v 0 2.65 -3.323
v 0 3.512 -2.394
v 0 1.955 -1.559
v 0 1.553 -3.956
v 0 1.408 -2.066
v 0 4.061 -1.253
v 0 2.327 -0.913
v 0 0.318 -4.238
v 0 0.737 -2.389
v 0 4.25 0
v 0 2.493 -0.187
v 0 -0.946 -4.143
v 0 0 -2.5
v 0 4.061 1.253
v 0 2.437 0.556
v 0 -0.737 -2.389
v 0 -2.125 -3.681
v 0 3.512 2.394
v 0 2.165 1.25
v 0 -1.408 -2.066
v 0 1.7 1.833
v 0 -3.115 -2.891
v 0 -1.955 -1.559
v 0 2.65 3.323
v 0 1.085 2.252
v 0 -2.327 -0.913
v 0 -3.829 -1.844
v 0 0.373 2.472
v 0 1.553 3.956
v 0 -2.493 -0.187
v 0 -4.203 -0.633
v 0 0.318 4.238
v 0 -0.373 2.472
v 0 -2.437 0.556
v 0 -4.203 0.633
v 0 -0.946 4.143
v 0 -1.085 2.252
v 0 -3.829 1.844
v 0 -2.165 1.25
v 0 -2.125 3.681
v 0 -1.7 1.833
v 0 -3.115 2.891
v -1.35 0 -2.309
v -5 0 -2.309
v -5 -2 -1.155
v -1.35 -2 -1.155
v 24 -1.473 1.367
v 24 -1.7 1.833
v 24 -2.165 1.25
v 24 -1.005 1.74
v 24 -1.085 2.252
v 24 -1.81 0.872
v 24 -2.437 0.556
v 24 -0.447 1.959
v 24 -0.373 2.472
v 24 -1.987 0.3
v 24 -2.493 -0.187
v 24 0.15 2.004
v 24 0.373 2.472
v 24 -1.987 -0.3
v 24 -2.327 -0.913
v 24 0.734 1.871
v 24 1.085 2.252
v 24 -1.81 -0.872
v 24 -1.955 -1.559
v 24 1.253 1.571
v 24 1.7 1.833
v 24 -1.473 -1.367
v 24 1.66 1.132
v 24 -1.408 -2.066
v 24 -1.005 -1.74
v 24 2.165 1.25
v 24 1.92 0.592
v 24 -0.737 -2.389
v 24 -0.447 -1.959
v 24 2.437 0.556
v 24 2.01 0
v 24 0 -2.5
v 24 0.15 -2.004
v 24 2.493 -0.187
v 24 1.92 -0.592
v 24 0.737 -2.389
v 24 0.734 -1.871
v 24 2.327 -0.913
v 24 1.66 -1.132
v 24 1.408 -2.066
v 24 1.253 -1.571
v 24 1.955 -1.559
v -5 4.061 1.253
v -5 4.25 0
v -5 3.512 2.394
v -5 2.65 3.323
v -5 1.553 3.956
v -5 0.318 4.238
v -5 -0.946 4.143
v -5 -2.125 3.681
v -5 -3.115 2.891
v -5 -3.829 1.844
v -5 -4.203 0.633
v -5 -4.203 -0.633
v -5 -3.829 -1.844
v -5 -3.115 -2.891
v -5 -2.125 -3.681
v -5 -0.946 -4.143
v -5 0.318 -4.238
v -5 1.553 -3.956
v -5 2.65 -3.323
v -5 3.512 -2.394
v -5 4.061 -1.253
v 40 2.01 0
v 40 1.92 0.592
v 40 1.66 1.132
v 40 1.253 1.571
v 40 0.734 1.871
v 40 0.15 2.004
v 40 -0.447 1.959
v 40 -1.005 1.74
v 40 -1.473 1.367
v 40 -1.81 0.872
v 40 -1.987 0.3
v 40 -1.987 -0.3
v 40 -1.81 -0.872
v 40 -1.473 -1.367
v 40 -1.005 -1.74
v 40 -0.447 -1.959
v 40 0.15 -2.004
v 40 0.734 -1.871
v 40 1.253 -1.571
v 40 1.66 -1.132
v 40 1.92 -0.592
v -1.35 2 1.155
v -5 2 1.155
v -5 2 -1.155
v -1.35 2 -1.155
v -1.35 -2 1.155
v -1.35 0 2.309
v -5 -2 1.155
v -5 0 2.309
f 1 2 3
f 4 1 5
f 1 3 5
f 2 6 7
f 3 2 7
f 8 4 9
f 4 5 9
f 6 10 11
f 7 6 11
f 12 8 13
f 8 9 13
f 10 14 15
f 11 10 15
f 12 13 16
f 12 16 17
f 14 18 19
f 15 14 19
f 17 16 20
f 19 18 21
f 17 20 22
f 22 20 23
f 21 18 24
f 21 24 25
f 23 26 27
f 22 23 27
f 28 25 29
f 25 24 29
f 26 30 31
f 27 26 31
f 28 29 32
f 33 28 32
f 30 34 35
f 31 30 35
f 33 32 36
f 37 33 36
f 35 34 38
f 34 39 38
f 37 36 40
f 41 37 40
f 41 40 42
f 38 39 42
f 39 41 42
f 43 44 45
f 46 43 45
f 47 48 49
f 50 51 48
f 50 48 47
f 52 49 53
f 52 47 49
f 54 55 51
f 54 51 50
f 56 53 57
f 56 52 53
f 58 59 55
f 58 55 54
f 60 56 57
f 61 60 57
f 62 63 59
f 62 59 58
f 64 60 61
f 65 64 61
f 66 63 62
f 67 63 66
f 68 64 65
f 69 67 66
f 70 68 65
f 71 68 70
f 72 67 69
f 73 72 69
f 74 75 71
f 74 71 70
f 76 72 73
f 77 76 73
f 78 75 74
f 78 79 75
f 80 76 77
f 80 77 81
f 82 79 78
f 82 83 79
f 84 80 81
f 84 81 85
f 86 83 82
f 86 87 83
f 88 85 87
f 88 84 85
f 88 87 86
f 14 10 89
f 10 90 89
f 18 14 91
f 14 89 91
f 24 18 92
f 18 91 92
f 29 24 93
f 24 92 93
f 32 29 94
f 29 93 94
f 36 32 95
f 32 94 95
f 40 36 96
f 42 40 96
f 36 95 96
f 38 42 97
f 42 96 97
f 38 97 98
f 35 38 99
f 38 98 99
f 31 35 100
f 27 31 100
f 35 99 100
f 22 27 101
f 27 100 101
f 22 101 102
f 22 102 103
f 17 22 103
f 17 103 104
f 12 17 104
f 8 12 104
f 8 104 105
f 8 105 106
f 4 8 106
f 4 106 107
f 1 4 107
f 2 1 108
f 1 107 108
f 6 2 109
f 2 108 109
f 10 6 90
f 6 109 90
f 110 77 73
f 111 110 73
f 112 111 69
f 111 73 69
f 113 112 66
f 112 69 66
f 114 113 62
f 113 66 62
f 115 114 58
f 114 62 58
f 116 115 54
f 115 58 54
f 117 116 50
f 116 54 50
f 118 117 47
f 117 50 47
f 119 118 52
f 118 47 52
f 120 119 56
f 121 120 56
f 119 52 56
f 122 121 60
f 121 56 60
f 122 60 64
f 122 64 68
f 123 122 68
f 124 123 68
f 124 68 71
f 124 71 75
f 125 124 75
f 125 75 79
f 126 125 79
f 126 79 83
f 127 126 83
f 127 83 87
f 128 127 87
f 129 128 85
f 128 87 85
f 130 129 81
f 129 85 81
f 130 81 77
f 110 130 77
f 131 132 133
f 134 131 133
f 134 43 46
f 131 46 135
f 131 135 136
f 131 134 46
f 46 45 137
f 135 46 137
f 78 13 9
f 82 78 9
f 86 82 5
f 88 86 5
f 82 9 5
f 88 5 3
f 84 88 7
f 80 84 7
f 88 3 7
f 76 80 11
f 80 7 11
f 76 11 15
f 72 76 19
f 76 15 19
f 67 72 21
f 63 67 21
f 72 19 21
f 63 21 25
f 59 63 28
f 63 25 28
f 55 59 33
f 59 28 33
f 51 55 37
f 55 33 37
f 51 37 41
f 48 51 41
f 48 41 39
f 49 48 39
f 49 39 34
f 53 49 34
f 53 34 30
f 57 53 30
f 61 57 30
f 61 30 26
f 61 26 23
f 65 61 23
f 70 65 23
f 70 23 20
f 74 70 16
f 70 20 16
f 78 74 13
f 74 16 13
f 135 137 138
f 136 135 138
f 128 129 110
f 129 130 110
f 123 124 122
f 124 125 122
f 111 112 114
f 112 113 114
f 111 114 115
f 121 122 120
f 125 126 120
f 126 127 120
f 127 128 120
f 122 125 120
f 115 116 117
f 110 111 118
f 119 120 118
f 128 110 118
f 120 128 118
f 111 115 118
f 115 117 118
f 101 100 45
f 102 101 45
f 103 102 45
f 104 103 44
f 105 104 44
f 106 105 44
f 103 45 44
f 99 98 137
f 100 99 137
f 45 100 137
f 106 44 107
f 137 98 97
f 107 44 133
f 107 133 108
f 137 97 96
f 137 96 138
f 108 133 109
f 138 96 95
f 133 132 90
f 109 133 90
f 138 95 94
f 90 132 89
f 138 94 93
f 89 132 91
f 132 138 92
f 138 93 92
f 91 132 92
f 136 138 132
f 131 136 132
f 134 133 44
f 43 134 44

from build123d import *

# Parameters (mm, degrees)
SCHNITT_LINEAR_AUSTRAGEN1_DEPTH = 3.65
SKIZZE3_R                       = 2.5
AUFSATZ_LINEAR_AUSTRAGEN1_DEPTH = 24


with BuildPart() as part:
    # Skizze1 → Basis-Rotation (revolve)
    with BuildSketch(Plane.XY):
        Polygon((40, 0), (40, 2.0095), (0, 2.0095), (0, 4.25), (-5, 4.25), (-5, 0), align=None)
    revolve(axis=Axis((0, 0, 0), (1, 0, 0)))

    # Skizze2 → Schnitt-Linear austragen1 (cut)
    with BuildSketch(Plane.ZY.offset(5)):
        Polygon((2.309401077, 0), (1.154700538, 2), (-1.154700538, 2), (-2.309401077, 0), (-1.154700538, -2), (1.154700538, -2), align=None)
    extrude(amount=-SCHNITT_LINEAR_AUSTRAGEN1_DEPTH, mode=Mode.SUBTRACT)

    # Skizze3 → Aufsatz-Linear austragen1 (add)
    with BuildSketch(Plane(origin=(0, 0, 0), x_dir=(0, 0, -1), z_dir=(1, 0, 0))):
        Circle(SKIZZE3_R)
    extrude(amount=AUFSATZ_LINEAR_AUSTRAGEN1_DEPTH)


solid = part.part
